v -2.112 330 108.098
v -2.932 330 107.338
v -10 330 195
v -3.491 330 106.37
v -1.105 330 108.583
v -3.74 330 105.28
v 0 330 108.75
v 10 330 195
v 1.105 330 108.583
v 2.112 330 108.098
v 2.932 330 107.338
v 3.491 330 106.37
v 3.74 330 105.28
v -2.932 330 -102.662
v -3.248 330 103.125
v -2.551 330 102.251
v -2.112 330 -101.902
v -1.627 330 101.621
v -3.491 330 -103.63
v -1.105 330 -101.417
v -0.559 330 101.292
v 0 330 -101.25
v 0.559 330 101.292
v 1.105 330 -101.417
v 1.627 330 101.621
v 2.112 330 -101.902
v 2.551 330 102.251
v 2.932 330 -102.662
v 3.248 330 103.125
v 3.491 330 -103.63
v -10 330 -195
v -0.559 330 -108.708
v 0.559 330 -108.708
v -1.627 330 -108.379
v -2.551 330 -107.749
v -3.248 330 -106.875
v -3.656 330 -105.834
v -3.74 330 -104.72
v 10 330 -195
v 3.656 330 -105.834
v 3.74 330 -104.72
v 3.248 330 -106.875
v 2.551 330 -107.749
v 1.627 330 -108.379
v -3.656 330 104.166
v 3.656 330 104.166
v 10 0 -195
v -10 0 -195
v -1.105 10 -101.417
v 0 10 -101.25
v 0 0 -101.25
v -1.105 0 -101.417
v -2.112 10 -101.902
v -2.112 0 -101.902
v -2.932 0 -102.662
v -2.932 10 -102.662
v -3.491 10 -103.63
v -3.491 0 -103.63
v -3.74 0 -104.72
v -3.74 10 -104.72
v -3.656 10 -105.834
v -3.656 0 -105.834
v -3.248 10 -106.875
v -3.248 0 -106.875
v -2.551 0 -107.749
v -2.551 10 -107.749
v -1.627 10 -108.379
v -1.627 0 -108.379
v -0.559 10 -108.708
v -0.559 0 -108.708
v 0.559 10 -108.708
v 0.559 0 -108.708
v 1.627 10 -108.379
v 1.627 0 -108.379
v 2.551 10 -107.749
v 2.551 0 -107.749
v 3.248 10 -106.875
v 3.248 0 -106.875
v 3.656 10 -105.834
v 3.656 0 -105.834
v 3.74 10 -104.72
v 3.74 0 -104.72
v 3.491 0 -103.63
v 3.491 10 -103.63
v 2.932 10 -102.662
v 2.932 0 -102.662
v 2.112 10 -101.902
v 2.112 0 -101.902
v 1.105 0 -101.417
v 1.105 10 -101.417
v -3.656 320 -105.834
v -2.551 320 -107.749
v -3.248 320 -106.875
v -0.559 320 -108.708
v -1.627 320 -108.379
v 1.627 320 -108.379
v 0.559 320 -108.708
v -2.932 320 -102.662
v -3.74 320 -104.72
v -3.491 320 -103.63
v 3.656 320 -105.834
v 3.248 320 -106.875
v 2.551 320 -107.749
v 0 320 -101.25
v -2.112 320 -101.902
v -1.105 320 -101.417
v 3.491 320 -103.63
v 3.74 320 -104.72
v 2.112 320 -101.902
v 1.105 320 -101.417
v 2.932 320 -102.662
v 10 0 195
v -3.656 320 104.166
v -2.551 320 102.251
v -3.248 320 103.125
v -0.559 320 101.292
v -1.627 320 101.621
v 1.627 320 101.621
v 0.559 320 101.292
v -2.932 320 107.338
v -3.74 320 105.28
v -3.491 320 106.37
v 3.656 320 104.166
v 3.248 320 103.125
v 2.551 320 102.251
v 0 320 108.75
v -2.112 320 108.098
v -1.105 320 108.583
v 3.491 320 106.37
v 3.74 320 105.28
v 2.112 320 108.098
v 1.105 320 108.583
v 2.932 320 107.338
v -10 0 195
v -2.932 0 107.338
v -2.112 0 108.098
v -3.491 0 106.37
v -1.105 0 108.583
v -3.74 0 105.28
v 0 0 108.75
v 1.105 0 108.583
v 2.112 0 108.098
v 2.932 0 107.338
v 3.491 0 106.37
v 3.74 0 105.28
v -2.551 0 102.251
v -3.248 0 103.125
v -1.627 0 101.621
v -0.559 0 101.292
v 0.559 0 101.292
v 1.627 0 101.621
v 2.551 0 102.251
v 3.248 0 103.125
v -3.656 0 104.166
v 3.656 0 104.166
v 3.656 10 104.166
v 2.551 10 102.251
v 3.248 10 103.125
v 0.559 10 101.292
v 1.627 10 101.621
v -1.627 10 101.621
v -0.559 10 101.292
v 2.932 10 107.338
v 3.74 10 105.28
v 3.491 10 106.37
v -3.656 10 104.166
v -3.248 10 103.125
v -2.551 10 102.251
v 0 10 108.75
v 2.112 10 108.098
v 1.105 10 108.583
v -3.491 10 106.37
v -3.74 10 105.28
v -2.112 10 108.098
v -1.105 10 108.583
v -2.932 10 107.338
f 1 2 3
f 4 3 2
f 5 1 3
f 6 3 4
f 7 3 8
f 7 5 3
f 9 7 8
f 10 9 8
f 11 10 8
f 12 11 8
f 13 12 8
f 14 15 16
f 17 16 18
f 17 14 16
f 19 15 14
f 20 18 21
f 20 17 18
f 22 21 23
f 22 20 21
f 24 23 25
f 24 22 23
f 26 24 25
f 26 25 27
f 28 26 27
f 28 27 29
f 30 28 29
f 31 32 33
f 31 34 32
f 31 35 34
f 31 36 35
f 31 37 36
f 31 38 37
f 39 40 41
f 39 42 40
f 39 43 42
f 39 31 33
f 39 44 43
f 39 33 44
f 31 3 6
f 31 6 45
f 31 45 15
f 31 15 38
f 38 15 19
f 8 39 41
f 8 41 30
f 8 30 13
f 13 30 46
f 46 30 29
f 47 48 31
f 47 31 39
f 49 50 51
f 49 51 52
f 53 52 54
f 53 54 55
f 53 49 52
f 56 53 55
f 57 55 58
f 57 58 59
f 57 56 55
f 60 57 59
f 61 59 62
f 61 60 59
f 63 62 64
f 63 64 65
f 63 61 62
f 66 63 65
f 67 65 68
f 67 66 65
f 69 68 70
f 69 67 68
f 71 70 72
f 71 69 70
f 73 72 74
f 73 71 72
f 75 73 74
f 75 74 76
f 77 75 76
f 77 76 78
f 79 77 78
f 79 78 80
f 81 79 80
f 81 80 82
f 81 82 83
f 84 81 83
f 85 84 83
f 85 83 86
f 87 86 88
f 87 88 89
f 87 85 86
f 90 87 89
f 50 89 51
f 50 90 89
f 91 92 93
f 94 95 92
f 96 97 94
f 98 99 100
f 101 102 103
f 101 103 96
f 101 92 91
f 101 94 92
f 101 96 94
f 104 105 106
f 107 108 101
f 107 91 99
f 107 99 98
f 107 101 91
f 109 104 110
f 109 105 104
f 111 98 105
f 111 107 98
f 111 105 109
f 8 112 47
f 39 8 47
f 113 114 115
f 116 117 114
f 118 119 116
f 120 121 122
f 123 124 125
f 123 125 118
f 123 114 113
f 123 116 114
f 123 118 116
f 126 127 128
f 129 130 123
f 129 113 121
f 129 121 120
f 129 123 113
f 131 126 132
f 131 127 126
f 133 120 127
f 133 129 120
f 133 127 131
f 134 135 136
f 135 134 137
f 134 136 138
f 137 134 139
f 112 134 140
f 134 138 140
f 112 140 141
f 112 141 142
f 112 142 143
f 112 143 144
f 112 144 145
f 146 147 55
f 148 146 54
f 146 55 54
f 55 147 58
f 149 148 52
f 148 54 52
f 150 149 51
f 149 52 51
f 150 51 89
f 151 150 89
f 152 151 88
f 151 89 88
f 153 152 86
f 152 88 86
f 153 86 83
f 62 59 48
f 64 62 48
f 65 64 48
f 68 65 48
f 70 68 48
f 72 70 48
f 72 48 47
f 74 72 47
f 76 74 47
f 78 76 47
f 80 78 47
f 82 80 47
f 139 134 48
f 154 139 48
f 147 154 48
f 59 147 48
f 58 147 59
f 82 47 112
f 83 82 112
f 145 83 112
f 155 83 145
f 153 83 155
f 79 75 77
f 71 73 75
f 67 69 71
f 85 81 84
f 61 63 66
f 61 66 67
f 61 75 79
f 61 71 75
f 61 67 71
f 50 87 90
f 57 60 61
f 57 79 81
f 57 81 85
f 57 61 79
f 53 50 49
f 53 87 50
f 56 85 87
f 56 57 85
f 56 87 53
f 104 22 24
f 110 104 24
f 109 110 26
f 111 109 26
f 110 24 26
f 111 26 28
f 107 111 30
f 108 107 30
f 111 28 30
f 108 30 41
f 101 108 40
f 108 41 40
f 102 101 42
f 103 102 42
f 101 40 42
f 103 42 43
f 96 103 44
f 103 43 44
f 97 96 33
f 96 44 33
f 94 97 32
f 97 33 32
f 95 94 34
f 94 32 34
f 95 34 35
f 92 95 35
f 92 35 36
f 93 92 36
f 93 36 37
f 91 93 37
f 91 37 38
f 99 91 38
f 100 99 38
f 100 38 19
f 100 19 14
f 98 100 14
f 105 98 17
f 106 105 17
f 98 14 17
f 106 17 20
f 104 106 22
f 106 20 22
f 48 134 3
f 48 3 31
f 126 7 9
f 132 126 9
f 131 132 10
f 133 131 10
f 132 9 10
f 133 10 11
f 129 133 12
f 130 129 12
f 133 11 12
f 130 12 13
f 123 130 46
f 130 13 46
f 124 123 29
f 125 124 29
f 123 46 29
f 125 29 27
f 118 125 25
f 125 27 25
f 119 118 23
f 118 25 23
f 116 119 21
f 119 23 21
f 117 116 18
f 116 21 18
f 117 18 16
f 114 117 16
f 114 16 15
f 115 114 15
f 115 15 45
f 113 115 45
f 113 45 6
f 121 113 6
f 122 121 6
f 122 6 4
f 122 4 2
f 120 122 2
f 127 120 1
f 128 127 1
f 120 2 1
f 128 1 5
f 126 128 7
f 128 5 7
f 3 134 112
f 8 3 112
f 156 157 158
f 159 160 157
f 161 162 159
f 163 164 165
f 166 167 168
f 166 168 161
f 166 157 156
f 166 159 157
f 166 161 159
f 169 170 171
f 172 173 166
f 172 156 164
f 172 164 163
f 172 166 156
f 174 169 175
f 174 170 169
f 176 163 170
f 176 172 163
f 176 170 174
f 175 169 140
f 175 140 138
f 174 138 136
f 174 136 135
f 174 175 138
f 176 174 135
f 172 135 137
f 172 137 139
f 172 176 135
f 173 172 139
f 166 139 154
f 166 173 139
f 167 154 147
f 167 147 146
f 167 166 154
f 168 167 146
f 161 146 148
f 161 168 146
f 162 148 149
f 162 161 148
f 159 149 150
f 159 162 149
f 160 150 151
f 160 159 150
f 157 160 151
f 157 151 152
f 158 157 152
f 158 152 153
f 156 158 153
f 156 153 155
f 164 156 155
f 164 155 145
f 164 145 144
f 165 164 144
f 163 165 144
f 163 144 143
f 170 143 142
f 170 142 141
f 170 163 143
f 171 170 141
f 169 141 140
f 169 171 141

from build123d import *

# Parameters (mm, degrees)
ESQUISSE1_W             = 20
ESQUISSE1_H             = 390
BOSS_EXTRU_1_DEPTH      = 330
ESQUISSE2_R             = 3.75
ENL_V_MAT_EXTRU_1_DEPTH = 10
ENL_V_START             = -10
ESQUISSE3_R             = 3.75
ENL_V_MAT_EXTRU_2_DEPTH = 10


with BuildPart() as part:
    # Esquisse1 → Boss.-Extru.1 (new body)
    with BuildSketch(Plane(origin=(0, 0, 0), x_dir=(1, 0, 0), z_dir=(0, 1, 0))):
        Rectangle(ESQUISSE1_W, ESQUISSE1_H)
    extrude(amount=BOSS_EXTRU_1_DEPTH)

    # Esquisse2 → Enlèv. mat.-Extru.1 (cut)
    with BuildSketch(Plane(origin=(0, 330, 0), x_dir=(1, 0, 0), z_dir=(0, 1, 0))):
        with Locations(Location((0, 105, 0), (0, 0, 270))):
            Circle(ESQUISSE2_R)
        with Locations(Location((0, -105, 0), (0, 0, 270))):
            Circle(ESQUISSE2_R)
    extrude(amount=-ENL_V_MAT_EXTRU_1_DEPTH, mode=Mode.SUBTRACT)

    # Esquisse3 → Enlèv. mat.-Extru.2 (cut)
    with BuildSketch(Plane.XZ.offset(ENL_V_START)):
        with Locations(Location((0, -105, 0), (0, 0, 90))):
            Circle(ESQUISSE3_R)
        with Locations(Location((0, 105, 0), (0, 0, 90))):
            Circle(ESQUISSE3_R)
    extrude(amount=ENL_V_MAT_EXTRU_2_DEPTH, mode=Mode.SUBTRACT)


solid = part.part
